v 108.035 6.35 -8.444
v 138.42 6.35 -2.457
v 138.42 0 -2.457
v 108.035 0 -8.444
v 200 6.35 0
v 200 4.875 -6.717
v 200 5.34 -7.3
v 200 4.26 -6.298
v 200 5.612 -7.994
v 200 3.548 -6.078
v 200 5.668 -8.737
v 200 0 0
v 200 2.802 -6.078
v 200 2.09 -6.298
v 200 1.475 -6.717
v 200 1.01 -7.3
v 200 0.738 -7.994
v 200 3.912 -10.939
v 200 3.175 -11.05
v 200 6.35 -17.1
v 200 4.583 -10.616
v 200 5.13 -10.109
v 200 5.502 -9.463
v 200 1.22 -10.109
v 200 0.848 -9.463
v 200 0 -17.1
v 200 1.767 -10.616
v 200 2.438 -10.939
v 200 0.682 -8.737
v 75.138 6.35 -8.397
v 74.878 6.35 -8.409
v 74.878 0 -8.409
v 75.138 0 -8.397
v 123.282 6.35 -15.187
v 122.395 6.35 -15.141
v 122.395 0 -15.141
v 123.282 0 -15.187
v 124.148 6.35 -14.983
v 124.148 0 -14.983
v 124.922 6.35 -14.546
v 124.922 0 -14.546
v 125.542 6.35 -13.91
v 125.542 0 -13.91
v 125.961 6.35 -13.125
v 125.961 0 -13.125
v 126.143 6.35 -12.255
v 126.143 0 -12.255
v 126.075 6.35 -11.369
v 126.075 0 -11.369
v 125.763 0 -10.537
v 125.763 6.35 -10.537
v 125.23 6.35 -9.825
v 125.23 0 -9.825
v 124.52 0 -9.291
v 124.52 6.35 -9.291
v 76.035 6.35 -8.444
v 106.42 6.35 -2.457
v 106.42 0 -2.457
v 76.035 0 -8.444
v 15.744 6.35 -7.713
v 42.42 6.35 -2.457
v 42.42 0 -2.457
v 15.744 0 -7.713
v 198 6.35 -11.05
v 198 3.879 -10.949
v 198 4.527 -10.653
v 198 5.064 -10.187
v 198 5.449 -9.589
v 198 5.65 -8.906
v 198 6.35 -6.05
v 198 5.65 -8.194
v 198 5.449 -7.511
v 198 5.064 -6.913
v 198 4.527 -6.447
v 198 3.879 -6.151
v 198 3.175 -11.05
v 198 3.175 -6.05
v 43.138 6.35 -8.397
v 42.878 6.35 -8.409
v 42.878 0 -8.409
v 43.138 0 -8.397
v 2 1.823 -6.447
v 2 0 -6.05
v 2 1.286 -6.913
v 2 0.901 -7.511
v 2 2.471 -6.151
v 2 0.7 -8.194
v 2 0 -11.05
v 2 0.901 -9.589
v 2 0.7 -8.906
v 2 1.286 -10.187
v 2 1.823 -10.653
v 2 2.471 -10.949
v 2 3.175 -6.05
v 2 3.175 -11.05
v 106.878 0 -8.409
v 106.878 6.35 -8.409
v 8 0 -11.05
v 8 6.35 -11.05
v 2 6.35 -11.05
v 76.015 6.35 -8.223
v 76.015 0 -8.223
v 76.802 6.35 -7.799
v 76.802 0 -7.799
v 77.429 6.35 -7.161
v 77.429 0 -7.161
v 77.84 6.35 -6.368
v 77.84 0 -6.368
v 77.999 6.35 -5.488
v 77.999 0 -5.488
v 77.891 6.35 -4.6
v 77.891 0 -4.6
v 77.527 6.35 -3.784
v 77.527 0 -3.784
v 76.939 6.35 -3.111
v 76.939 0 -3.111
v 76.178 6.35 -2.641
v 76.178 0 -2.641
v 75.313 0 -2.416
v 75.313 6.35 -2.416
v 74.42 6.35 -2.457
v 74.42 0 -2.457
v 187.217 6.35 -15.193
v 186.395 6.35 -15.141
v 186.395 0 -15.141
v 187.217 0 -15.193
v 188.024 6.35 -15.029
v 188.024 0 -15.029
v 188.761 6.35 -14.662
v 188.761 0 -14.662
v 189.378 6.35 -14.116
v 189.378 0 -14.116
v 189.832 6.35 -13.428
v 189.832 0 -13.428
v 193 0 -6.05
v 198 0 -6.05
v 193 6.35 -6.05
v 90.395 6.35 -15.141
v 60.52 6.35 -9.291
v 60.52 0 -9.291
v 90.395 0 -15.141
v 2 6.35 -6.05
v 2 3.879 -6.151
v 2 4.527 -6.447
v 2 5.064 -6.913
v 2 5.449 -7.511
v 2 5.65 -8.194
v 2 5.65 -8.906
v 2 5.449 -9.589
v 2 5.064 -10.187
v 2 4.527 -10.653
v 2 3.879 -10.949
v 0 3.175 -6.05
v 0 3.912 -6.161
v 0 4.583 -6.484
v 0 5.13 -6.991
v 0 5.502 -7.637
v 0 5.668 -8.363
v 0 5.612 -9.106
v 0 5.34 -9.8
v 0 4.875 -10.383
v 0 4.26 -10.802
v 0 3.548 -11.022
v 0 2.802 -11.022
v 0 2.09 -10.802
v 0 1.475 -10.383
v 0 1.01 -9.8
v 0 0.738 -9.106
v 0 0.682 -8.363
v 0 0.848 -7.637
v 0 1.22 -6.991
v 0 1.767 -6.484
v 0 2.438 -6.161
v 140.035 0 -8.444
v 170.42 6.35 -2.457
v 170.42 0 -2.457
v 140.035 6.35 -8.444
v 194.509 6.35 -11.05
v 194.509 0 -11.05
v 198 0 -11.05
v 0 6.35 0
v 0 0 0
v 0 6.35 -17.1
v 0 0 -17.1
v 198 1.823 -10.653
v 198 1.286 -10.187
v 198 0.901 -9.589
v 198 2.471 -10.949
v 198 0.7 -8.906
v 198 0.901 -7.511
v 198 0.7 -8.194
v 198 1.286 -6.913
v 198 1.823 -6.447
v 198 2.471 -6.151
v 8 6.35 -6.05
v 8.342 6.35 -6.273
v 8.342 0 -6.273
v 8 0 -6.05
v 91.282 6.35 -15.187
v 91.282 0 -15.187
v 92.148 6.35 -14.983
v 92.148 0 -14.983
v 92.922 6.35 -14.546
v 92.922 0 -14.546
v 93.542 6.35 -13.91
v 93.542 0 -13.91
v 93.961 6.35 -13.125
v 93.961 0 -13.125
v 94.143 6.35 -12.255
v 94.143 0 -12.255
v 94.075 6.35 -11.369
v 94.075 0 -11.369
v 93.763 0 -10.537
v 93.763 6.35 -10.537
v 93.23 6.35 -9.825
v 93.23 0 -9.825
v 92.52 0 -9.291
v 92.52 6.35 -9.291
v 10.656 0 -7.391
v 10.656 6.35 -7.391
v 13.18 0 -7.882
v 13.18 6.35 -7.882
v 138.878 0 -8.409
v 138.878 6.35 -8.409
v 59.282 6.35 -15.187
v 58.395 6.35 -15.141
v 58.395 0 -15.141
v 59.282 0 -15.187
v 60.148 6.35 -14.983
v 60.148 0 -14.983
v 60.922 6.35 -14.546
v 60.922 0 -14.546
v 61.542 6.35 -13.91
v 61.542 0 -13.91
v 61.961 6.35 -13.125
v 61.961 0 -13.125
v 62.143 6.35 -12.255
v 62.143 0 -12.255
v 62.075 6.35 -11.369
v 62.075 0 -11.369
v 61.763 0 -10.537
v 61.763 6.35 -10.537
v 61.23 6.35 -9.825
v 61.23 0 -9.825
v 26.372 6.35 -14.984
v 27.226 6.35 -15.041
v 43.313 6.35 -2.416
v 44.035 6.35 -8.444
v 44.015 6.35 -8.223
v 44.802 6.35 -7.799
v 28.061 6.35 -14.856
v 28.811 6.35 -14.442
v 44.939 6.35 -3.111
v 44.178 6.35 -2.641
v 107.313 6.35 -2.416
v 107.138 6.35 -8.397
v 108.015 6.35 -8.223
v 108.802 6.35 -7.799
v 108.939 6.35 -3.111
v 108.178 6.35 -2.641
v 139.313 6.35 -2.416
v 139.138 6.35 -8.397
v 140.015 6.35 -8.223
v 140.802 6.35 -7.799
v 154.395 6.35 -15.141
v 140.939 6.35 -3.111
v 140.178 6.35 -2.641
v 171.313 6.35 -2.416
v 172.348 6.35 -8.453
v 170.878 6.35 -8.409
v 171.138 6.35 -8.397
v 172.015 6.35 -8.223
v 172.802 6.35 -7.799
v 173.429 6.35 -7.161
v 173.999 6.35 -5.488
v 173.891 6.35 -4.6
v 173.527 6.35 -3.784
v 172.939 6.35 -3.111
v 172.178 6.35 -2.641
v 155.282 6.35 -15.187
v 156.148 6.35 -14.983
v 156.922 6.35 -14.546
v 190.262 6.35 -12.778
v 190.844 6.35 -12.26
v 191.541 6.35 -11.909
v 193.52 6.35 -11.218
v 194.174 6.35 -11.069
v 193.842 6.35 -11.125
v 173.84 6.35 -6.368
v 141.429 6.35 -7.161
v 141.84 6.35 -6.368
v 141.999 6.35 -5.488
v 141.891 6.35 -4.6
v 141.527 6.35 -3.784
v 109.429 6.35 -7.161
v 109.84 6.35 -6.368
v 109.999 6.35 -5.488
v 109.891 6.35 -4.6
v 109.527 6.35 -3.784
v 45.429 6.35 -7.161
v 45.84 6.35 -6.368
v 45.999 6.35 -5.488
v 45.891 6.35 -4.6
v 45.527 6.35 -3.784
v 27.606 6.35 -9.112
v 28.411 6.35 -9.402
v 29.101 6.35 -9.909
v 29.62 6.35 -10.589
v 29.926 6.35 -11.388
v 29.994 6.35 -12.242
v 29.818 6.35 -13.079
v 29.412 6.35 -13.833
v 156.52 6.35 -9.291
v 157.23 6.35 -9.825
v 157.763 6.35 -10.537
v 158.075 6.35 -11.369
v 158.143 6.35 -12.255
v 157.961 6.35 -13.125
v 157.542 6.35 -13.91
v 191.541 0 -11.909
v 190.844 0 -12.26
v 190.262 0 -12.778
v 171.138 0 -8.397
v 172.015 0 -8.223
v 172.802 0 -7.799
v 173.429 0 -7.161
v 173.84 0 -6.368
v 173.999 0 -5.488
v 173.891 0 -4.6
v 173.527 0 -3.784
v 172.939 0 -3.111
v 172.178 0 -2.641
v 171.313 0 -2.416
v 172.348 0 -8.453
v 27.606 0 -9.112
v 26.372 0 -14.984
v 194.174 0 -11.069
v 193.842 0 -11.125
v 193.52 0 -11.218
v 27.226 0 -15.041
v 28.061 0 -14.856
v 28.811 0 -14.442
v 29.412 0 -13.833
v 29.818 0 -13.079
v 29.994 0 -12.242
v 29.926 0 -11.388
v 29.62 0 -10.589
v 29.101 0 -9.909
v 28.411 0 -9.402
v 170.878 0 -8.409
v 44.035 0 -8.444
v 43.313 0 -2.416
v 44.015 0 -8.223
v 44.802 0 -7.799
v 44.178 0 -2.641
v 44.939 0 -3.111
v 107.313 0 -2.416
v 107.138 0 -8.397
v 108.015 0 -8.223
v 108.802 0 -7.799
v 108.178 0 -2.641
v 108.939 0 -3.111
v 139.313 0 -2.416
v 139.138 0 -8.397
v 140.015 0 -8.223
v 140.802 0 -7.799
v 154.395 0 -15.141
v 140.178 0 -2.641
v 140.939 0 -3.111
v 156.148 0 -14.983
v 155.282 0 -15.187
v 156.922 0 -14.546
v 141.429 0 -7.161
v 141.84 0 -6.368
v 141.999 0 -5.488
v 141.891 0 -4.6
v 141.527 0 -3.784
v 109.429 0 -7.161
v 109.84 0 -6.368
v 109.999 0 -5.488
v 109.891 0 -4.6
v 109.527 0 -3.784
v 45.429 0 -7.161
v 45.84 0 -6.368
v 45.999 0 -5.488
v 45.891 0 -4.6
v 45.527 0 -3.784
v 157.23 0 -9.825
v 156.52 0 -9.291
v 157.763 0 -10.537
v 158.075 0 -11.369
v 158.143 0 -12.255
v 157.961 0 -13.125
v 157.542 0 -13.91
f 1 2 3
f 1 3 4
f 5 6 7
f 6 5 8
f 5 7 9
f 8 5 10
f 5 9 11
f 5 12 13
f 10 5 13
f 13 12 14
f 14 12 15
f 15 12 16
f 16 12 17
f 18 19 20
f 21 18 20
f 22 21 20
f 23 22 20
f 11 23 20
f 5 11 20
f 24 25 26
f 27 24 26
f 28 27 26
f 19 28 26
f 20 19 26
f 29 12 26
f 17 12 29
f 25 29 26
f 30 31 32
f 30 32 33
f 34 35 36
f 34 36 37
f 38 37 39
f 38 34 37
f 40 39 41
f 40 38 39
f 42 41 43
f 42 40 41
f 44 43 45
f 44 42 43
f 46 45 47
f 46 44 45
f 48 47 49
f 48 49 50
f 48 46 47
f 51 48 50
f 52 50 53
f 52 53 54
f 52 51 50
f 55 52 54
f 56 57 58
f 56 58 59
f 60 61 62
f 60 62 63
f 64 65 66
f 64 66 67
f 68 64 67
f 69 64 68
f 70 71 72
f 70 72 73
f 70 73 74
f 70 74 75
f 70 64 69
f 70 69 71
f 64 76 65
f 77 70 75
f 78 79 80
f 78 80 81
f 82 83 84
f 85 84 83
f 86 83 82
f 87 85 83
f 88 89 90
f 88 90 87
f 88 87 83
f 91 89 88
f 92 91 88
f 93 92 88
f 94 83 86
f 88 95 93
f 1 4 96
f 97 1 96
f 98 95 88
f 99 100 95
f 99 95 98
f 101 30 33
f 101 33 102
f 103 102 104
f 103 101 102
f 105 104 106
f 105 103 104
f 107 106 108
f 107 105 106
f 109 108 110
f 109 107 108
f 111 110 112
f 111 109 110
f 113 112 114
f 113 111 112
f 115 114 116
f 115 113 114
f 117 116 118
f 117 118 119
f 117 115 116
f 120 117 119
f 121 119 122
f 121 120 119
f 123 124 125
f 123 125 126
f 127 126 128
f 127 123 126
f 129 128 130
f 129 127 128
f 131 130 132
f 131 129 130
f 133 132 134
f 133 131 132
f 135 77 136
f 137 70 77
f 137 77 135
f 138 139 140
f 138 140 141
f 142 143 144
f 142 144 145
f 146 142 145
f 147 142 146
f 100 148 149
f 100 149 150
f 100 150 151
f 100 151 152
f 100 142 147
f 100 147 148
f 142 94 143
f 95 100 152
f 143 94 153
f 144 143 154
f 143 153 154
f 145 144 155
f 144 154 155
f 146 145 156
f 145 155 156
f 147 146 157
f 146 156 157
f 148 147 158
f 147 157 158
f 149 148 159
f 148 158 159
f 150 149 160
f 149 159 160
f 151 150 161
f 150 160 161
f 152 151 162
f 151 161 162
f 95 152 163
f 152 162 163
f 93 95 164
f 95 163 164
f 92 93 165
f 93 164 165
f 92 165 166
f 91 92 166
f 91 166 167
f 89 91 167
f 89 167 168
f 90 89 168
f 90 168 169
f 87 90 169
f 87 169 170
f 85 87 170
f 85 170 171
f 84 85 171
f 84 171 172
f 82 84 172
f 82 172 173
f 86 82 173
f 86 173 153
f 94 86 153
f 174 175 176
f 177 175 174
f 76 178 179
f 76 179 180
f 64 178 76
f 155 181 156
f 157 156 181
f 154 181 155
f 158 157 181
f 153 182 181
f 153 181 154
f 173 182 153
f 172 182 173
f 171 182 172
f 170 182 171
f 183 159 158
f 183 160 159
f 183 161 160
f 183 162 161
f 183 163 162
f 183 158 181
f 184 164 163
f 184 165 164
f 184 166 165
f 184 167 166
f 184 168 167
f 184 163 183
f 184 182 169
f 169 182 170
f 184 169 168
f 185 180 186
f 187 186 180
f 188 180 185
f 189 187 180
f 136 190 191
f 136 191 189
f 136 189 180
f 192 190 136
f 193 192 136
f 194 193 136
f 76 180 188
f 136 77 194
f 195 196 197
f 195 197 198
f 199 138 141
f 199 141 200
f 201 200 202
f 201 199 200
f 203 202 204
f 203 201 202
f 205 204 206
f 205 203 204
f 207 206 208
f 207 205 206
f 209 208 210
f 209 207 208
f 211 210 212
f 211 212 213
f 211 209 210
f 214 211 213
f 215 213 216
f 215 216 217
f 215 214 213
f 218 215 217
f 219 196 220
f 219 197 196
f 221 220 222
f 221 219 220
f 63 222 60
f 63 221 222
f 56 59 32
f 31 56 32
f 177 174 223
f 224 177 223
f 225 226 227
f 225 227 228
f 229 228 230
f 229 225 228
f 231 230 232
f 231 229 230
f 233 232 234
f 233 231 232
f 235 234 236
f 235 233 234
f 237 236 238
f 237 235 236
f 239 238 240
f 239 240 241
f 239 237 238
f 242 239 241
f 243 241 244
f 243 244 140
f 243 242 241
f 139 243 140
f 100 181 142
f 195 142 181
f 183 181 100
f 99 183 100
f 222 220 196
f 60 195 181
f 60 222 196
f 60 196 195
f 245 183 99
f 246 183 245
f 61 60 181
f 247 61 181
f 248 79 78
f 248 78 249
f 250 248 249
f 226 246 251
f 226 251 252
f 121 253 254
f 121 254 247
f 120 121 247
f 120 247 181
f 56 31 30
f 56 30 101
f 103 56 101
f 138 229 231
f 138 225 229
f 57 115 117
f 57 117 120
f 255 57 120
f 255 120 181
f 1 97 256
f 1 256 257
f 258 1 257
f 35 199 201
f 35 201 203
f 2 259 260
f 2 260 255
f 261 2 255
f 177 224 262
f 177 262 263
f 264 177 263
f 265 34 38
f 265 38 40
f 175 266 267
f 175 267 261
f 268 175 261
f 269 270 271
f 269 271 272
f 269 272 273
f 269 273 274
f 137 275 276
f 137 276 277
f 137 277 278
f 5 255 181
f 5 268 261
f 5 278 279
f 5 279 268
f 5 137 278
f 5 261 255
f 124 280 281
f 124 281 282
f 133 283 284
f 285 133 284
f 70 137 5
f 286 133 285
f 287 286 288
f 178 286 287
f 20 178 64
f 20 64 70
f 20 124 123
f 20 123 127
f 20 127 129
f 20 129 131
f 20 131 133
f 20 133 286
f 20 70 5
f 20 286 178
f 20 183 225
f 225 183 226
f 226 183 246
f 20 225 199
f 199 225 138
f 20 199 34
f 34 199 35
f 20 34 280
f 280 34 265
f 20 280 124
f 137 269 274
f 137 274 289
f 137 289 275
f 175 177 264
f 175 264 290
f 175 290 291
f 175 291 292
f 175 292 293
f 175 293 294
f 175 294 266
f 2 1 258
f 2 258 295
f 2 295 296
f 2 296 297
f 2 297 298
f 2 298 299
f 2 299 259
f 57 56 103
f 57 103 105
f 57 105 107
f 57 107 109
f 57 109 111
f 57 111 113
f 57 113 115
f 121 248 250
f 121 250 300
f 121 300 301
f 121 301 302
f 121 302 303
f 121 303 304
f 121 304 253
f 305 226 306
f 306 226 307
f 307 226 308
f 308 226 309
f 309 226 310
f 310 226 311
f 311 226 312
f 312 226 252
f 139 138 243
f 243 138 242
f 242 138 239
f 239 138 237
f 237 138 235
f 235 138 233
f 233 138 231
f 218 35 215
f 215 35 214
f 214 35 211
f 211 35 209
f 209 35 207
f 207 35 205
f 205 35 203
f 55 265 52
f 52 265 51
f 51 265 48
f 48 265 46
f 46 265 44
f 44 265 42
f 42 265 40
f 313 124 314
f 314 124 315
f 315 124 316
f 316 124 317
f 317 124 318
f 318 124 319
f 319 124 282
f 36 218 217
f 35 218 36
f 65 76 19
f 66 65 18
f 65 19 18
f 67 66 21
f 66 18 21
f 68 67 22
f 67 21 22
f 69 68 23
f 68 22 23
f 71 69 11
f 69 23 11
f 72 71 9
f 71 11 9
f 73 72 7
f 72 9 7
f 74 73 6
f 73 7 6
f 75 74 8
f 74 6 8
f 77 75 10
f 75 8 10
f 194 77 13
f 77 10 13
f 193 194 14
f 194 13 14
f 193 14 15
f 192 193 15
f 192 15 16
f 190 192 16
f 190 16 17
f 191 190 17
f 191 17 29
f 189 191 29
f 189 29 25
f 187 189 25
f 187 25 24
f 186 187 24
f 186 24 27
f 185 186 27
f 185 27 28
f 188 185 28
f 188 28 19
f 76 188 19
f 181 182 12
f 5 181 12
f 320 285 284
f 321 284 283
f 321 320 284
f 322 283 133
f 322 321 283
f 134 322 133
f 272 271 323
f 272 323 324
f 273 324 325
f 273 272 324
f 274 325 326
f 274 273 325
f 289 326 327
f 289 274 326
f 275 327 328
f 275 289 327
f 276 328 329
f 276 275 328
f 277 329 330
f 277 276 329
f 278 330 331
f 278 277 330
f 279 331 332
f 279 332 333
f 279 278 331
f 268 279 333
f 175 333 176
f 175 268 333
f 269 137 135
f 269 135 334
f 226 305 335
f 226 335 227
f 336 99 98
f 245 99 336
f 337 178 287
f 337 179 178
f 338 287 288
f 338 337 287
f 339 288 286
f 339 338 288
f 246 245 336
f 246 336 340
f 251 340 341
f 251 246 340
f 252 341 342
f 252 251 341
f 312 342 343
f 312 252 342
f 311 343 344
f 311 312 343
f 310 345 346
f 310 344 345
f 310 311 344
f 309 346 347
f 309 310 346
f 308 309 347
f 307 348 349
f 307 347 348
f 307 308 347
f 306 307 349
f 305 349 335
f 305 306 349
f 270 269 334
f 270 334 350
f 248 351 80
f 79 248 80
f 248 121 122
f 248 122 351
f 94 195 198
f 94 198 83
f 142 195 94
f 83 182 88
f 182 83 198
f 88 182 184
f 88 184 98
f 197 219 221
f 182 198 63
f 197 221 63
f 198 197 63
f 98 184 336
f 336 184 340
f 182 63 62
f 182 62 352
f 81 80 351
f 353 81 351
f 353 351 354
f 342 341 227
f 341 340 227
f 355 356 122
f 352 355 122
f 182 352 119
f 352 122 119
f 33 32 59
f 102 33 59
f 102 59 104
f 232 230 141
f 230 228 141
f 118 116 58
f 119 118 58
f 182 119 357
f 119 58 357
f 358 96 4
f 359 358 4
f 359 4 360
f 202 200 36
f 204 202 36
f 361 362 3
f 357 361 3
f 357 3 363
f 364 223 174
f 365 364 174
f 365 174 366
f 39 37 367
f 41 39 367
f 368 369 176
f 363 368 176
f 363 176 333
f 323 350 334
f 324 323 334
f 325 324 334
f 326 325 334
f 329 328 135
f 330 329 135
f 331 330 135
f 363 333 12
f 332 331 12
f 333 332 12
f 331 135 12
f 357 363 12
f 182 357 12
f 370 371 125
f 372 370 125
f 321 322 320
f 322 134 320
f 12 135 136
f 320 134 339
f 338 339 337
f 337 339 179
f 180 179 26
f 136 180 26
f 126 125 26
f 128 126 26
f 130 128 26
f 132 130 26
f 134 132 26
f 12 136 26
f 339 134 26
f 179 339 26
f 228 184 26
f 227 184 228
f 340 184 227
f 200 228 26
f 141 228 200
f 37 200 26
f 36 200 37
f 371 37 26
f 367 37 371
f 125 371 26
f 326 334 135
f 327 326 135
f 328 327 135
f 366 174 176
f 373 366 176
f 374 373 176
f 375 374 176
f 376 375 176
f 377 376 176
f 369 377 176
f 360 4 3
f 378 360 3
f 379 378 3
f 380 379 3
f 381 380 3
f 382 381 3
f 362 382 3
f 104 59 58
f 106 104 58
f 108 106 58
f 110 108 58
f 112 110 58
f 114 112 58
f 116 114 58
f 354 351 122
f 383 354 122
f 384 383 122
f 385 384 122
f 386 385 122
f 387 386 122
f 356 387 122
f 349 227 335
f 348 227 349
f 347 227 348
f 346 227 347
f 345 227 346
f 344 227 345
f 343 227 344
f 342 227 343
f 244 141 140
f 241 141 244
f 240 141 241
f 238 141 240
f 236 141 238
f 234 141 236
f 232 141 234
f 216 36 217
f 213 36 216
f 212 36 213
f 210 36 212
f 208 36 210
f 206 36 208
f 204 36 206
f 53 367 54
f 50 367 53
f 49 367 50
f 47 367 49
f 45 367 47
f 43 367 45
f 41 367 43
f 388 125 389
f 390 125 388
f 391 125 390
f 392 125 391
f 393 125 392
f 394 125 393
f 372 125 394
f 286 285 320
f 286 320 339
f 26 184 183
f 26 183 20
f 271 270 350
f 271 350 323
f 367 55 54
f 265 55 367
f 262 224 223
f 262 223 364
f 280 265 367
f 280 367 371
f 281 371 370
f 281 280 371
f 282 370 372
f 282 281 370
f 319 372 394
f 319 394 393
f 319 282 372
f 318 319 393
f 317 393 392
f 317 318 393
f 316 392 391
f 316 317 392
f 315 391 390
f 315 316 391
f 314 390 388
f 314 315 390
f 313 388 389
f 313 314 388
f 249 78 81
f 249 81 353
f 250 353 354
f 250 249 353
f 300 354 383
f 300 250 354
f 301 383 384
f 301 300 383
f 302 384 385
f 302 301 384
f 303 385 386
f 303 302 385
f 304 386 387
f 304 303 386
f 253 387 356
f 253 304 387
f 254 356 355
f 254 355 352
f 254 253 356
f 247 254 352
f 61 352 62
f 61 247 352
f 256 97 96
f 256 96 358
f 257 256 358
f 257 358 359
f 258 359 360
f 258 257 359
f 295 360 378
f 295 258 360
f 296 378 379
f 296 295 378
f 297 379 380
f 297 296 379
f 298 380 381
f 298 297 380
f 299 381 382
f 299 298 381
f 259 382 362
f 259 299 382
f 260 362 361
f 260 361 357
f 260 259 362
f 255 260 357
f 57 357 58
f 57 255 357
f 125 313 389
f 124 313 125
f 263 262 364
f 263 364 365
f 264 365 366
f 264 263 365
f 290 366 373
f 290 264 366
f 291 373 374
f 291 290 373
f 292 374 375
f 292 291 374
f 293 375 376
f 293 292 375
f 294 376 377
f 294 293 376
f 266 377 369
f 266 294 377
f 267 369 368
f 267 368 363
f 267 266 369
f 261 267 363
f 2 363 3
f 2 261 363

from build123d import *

# Parameters (mm, degrees)
SKETCH1_W           = 200
SKETCH1_H           = 17.1
BOSS_EXTRUDE1_DEPTH = 6.35
CUT_EXTRUDE1_REACH  = 8.35
CUT_EXTRUDE2_DEPTH  = 6.35
LPATTERN1_COUNT     = 5
LPATTERN1_PITCH     = 32
CUT_EXTRUDE3_DEPTH  = 6.35
LPATTERN2_COUNT     = 5
LPATTERN2_PITCH     = 32
FILLET1_R           = 10
CUT_EXTRUDE6_REACH  = 8.35
FILLET2_R           = 3
CUT_EXTRUDE7_REACH  = 202
SKETCH6_R           = 2.5
CUT_EXTRUDE8_REACH  = 202
SKETCH7_R           = 2.5


with BuildPart() as part:
    # Sketch1 → Boss-Extrude1 (new body)
    with BuildSketch(Plane(origin=(0, 0, 0), x_dir=(1, 0, 0), z_dir=(0, 1, 0))):
        with Locations((100, 8.55)):
            Rectangle(SKETCH1_W, SKETCH1_H)
    extrude(amount=BOSS_EXTRUDE1_DEPTH)

    # Sketch2 → Cut-Extrude1 (cut, up to next)
    with BuildSketch(Plane(origin=(0, 6.35, 0), x_dir=(1, 0, 0), z_dir=(0, 1, 0)), mode=Mode.PRIVATE) as cut_extrude1_sk1:
        with BuildLine():
            Line((2, 11.05), (8, 11.05))
            Line((8, 11.05), (26.371920214, 14.983515942))
            ThreePointArc((26.371920214, 14.983515942), (29.935888288, 12.666895422), (27.605702097, 9.111782008))
            Line((27.605702097, 9.111782008), (11.75, 8.5))
            Line((11.75, 8.5), (8, 6.05))
            Line((8, 6.05), (2, 6.05))
            Line((2, 6.05), (2, 11.05))
        make_face()
    cut_extrude1_tool1 = extrude(cut_extrude1_sk1.sketch, amount=-CUT_EXTRUDE1_REACH, mode=Mode.PRIVATE) & part.part
    add(cut_extrude1_tool1.solids().sort_by_distance((16.294125, 6.35, -10.477607))[0], mode=Mode.SUBTRACT)

    # Sketch3 → Cut-Extrude2 (cut)
    with BuildSketch(Plane(origin=(0, 6.35, 0), x_dir=(1, 0, 0), z_dir=(0, 1, 0))):
        with BuildLine():
            Line((42.420014497, 2.456597748), (11.75, 8.5))
            Line((11.75, 8.5), (27.605702097, 9.111782008))
            Line((27.605702097, 9.111782008), (43.1379451, 8.396826847))
            ThreePointArc((43.1379451, 8.396826847), (45.978326773, 5.040042176), (42.420014497, 2.456597748))
        make_face()
    cut_extrude2 = extrude(amount=-CUT_EXTRUDE2_DEPTH, mode=Mode.SUBTRACT)

    # LPattern1: Cut-Extrude2 ×5
    with Locations(*[(i * LPATTERN1_PITCH, 0, 0) for i in range(1, LPATTERN1_COUNT)]):
        add(cut_extrude2, mode=Mode.SUBTRACT)

    # Sketch4 → Cut-Extrude3 (cut)
    with BuildSketch(Plane(origin=(0, 6.35, 0), x_dir=(1, 0, 0), z_dir=(0, 1, 0))):
        with BuildLine():
            Line((27.605702097, 9.111782008), (58.394623882, 15.141281248))
            ThreePointArc((58.394623882, 15.141281248), (62.130306809, 12.401680657), (59.095650073, 8.901452547))
            Line((59.095650073, 8.901452547), (42.878228619, 8.408781697))
            Line((42.878228619, 8.408781697), (27.605702097, 9.111782008))
        make_face()
    cut_extrude3 = extrude(amount=-CUT_EXTRUDE3_DEPTH, mode=Mode.SUBTRACT)

    # LPattern2: Cut-Extrude3 ×5
    with Locations(*[(i * LPATTERN2_PITCH, 0, 0) for i in range(1, LPATTERN2_COUNT)]):
        add(cut_extrude3, mode=Mode.SUBTRACT)

    # Fillet1
    fillet1_edges = [part.edges().sort_by_distance(p)[0] for p in [
        (11.75, 3.175, -8.5),
    ]]
    fillet(fillet1_edges, radius=FILLET1_R)

    # Sketch5 → Cut-Extrude6 (cut, up to next)
    with BuildSketch(Plane(origin=(0, 6.35, 0), x_dir=(1, 0, 0), z_dir=(0, 1, 0)), mode=Mode.PRIVATE) as cut_extrude6_sk1:
        Polygon((198, 6.05), (193, 6.05), (172.348389916, 8.453443891), (190.130306809, 12.401680657), (194, 11.05), (198, 11.05), align=None)
    cut_extrude6_tool1 = extrude(cut_extrude6_sk1.sketch, amount=-CUT_EXTRUDE6_REACH, mode=Mode.PRIVATE) & part.part
    add(cut_extrude6_tool1.solids().sort_by_distance((188.45236, 6.35, -8.941649))[0], mode=Mode.SUBTRACT)

    # Fillet2
    fillet2_edges = [part.edges().sort_by_distance(p)[0] for p in [
        (190.130306809, 3.175, -12.401680657),
        (194, 3.175, -11.05),
    ]]
    fillet(fillet2_edges, radius=FILLET2_R)

    # Sketch6 → Cut-Extrude7 (cut, up to next)
    with BuildSketch(Plane(origin=(200, 0, 0), x_dir=(0, 0, -1), z_dir=(1, 0, 0)), mode=Mode.PRIVATE) as cut_extrude7_sk1:
        with Locations((8.55, 3.175)):
            Circle(SKETCH6_R)
    cut_extrude7_tool1 = extrude(cut_extrude7_sk1.sketch, amount=-CUT_EXTRUDE7_REACH, mode=Mode.PRIVATE) & part.part
    add(cut_extrude7_tool1.solids().sort_by_distance((200, 3.175, -8.55))[0], mode=Mode.SUBTRACT)

    # Sketch7 → Cut-Extrude8 (cut, up to next)
    with BuildSketch(Plane.ZY, mode=Mode.PRIVATE) as cut_extrude8_sk1:
        with Locations((-8.55, 3.175)):
            Circle(SKETCH7_R)
    cut_extrude8_tool1 = extrude(cut_extrude8_sk1.sketch, amount=-CUT_EXTRUDE8_REACH, mode=Mode.PRIVATE) & part.part
    add(cut_extrude8_tool1.solids().sort_by_distance((0, 3.175, -8.55))[0], mode=Mode.SUBTRACT)


solid = part.part
